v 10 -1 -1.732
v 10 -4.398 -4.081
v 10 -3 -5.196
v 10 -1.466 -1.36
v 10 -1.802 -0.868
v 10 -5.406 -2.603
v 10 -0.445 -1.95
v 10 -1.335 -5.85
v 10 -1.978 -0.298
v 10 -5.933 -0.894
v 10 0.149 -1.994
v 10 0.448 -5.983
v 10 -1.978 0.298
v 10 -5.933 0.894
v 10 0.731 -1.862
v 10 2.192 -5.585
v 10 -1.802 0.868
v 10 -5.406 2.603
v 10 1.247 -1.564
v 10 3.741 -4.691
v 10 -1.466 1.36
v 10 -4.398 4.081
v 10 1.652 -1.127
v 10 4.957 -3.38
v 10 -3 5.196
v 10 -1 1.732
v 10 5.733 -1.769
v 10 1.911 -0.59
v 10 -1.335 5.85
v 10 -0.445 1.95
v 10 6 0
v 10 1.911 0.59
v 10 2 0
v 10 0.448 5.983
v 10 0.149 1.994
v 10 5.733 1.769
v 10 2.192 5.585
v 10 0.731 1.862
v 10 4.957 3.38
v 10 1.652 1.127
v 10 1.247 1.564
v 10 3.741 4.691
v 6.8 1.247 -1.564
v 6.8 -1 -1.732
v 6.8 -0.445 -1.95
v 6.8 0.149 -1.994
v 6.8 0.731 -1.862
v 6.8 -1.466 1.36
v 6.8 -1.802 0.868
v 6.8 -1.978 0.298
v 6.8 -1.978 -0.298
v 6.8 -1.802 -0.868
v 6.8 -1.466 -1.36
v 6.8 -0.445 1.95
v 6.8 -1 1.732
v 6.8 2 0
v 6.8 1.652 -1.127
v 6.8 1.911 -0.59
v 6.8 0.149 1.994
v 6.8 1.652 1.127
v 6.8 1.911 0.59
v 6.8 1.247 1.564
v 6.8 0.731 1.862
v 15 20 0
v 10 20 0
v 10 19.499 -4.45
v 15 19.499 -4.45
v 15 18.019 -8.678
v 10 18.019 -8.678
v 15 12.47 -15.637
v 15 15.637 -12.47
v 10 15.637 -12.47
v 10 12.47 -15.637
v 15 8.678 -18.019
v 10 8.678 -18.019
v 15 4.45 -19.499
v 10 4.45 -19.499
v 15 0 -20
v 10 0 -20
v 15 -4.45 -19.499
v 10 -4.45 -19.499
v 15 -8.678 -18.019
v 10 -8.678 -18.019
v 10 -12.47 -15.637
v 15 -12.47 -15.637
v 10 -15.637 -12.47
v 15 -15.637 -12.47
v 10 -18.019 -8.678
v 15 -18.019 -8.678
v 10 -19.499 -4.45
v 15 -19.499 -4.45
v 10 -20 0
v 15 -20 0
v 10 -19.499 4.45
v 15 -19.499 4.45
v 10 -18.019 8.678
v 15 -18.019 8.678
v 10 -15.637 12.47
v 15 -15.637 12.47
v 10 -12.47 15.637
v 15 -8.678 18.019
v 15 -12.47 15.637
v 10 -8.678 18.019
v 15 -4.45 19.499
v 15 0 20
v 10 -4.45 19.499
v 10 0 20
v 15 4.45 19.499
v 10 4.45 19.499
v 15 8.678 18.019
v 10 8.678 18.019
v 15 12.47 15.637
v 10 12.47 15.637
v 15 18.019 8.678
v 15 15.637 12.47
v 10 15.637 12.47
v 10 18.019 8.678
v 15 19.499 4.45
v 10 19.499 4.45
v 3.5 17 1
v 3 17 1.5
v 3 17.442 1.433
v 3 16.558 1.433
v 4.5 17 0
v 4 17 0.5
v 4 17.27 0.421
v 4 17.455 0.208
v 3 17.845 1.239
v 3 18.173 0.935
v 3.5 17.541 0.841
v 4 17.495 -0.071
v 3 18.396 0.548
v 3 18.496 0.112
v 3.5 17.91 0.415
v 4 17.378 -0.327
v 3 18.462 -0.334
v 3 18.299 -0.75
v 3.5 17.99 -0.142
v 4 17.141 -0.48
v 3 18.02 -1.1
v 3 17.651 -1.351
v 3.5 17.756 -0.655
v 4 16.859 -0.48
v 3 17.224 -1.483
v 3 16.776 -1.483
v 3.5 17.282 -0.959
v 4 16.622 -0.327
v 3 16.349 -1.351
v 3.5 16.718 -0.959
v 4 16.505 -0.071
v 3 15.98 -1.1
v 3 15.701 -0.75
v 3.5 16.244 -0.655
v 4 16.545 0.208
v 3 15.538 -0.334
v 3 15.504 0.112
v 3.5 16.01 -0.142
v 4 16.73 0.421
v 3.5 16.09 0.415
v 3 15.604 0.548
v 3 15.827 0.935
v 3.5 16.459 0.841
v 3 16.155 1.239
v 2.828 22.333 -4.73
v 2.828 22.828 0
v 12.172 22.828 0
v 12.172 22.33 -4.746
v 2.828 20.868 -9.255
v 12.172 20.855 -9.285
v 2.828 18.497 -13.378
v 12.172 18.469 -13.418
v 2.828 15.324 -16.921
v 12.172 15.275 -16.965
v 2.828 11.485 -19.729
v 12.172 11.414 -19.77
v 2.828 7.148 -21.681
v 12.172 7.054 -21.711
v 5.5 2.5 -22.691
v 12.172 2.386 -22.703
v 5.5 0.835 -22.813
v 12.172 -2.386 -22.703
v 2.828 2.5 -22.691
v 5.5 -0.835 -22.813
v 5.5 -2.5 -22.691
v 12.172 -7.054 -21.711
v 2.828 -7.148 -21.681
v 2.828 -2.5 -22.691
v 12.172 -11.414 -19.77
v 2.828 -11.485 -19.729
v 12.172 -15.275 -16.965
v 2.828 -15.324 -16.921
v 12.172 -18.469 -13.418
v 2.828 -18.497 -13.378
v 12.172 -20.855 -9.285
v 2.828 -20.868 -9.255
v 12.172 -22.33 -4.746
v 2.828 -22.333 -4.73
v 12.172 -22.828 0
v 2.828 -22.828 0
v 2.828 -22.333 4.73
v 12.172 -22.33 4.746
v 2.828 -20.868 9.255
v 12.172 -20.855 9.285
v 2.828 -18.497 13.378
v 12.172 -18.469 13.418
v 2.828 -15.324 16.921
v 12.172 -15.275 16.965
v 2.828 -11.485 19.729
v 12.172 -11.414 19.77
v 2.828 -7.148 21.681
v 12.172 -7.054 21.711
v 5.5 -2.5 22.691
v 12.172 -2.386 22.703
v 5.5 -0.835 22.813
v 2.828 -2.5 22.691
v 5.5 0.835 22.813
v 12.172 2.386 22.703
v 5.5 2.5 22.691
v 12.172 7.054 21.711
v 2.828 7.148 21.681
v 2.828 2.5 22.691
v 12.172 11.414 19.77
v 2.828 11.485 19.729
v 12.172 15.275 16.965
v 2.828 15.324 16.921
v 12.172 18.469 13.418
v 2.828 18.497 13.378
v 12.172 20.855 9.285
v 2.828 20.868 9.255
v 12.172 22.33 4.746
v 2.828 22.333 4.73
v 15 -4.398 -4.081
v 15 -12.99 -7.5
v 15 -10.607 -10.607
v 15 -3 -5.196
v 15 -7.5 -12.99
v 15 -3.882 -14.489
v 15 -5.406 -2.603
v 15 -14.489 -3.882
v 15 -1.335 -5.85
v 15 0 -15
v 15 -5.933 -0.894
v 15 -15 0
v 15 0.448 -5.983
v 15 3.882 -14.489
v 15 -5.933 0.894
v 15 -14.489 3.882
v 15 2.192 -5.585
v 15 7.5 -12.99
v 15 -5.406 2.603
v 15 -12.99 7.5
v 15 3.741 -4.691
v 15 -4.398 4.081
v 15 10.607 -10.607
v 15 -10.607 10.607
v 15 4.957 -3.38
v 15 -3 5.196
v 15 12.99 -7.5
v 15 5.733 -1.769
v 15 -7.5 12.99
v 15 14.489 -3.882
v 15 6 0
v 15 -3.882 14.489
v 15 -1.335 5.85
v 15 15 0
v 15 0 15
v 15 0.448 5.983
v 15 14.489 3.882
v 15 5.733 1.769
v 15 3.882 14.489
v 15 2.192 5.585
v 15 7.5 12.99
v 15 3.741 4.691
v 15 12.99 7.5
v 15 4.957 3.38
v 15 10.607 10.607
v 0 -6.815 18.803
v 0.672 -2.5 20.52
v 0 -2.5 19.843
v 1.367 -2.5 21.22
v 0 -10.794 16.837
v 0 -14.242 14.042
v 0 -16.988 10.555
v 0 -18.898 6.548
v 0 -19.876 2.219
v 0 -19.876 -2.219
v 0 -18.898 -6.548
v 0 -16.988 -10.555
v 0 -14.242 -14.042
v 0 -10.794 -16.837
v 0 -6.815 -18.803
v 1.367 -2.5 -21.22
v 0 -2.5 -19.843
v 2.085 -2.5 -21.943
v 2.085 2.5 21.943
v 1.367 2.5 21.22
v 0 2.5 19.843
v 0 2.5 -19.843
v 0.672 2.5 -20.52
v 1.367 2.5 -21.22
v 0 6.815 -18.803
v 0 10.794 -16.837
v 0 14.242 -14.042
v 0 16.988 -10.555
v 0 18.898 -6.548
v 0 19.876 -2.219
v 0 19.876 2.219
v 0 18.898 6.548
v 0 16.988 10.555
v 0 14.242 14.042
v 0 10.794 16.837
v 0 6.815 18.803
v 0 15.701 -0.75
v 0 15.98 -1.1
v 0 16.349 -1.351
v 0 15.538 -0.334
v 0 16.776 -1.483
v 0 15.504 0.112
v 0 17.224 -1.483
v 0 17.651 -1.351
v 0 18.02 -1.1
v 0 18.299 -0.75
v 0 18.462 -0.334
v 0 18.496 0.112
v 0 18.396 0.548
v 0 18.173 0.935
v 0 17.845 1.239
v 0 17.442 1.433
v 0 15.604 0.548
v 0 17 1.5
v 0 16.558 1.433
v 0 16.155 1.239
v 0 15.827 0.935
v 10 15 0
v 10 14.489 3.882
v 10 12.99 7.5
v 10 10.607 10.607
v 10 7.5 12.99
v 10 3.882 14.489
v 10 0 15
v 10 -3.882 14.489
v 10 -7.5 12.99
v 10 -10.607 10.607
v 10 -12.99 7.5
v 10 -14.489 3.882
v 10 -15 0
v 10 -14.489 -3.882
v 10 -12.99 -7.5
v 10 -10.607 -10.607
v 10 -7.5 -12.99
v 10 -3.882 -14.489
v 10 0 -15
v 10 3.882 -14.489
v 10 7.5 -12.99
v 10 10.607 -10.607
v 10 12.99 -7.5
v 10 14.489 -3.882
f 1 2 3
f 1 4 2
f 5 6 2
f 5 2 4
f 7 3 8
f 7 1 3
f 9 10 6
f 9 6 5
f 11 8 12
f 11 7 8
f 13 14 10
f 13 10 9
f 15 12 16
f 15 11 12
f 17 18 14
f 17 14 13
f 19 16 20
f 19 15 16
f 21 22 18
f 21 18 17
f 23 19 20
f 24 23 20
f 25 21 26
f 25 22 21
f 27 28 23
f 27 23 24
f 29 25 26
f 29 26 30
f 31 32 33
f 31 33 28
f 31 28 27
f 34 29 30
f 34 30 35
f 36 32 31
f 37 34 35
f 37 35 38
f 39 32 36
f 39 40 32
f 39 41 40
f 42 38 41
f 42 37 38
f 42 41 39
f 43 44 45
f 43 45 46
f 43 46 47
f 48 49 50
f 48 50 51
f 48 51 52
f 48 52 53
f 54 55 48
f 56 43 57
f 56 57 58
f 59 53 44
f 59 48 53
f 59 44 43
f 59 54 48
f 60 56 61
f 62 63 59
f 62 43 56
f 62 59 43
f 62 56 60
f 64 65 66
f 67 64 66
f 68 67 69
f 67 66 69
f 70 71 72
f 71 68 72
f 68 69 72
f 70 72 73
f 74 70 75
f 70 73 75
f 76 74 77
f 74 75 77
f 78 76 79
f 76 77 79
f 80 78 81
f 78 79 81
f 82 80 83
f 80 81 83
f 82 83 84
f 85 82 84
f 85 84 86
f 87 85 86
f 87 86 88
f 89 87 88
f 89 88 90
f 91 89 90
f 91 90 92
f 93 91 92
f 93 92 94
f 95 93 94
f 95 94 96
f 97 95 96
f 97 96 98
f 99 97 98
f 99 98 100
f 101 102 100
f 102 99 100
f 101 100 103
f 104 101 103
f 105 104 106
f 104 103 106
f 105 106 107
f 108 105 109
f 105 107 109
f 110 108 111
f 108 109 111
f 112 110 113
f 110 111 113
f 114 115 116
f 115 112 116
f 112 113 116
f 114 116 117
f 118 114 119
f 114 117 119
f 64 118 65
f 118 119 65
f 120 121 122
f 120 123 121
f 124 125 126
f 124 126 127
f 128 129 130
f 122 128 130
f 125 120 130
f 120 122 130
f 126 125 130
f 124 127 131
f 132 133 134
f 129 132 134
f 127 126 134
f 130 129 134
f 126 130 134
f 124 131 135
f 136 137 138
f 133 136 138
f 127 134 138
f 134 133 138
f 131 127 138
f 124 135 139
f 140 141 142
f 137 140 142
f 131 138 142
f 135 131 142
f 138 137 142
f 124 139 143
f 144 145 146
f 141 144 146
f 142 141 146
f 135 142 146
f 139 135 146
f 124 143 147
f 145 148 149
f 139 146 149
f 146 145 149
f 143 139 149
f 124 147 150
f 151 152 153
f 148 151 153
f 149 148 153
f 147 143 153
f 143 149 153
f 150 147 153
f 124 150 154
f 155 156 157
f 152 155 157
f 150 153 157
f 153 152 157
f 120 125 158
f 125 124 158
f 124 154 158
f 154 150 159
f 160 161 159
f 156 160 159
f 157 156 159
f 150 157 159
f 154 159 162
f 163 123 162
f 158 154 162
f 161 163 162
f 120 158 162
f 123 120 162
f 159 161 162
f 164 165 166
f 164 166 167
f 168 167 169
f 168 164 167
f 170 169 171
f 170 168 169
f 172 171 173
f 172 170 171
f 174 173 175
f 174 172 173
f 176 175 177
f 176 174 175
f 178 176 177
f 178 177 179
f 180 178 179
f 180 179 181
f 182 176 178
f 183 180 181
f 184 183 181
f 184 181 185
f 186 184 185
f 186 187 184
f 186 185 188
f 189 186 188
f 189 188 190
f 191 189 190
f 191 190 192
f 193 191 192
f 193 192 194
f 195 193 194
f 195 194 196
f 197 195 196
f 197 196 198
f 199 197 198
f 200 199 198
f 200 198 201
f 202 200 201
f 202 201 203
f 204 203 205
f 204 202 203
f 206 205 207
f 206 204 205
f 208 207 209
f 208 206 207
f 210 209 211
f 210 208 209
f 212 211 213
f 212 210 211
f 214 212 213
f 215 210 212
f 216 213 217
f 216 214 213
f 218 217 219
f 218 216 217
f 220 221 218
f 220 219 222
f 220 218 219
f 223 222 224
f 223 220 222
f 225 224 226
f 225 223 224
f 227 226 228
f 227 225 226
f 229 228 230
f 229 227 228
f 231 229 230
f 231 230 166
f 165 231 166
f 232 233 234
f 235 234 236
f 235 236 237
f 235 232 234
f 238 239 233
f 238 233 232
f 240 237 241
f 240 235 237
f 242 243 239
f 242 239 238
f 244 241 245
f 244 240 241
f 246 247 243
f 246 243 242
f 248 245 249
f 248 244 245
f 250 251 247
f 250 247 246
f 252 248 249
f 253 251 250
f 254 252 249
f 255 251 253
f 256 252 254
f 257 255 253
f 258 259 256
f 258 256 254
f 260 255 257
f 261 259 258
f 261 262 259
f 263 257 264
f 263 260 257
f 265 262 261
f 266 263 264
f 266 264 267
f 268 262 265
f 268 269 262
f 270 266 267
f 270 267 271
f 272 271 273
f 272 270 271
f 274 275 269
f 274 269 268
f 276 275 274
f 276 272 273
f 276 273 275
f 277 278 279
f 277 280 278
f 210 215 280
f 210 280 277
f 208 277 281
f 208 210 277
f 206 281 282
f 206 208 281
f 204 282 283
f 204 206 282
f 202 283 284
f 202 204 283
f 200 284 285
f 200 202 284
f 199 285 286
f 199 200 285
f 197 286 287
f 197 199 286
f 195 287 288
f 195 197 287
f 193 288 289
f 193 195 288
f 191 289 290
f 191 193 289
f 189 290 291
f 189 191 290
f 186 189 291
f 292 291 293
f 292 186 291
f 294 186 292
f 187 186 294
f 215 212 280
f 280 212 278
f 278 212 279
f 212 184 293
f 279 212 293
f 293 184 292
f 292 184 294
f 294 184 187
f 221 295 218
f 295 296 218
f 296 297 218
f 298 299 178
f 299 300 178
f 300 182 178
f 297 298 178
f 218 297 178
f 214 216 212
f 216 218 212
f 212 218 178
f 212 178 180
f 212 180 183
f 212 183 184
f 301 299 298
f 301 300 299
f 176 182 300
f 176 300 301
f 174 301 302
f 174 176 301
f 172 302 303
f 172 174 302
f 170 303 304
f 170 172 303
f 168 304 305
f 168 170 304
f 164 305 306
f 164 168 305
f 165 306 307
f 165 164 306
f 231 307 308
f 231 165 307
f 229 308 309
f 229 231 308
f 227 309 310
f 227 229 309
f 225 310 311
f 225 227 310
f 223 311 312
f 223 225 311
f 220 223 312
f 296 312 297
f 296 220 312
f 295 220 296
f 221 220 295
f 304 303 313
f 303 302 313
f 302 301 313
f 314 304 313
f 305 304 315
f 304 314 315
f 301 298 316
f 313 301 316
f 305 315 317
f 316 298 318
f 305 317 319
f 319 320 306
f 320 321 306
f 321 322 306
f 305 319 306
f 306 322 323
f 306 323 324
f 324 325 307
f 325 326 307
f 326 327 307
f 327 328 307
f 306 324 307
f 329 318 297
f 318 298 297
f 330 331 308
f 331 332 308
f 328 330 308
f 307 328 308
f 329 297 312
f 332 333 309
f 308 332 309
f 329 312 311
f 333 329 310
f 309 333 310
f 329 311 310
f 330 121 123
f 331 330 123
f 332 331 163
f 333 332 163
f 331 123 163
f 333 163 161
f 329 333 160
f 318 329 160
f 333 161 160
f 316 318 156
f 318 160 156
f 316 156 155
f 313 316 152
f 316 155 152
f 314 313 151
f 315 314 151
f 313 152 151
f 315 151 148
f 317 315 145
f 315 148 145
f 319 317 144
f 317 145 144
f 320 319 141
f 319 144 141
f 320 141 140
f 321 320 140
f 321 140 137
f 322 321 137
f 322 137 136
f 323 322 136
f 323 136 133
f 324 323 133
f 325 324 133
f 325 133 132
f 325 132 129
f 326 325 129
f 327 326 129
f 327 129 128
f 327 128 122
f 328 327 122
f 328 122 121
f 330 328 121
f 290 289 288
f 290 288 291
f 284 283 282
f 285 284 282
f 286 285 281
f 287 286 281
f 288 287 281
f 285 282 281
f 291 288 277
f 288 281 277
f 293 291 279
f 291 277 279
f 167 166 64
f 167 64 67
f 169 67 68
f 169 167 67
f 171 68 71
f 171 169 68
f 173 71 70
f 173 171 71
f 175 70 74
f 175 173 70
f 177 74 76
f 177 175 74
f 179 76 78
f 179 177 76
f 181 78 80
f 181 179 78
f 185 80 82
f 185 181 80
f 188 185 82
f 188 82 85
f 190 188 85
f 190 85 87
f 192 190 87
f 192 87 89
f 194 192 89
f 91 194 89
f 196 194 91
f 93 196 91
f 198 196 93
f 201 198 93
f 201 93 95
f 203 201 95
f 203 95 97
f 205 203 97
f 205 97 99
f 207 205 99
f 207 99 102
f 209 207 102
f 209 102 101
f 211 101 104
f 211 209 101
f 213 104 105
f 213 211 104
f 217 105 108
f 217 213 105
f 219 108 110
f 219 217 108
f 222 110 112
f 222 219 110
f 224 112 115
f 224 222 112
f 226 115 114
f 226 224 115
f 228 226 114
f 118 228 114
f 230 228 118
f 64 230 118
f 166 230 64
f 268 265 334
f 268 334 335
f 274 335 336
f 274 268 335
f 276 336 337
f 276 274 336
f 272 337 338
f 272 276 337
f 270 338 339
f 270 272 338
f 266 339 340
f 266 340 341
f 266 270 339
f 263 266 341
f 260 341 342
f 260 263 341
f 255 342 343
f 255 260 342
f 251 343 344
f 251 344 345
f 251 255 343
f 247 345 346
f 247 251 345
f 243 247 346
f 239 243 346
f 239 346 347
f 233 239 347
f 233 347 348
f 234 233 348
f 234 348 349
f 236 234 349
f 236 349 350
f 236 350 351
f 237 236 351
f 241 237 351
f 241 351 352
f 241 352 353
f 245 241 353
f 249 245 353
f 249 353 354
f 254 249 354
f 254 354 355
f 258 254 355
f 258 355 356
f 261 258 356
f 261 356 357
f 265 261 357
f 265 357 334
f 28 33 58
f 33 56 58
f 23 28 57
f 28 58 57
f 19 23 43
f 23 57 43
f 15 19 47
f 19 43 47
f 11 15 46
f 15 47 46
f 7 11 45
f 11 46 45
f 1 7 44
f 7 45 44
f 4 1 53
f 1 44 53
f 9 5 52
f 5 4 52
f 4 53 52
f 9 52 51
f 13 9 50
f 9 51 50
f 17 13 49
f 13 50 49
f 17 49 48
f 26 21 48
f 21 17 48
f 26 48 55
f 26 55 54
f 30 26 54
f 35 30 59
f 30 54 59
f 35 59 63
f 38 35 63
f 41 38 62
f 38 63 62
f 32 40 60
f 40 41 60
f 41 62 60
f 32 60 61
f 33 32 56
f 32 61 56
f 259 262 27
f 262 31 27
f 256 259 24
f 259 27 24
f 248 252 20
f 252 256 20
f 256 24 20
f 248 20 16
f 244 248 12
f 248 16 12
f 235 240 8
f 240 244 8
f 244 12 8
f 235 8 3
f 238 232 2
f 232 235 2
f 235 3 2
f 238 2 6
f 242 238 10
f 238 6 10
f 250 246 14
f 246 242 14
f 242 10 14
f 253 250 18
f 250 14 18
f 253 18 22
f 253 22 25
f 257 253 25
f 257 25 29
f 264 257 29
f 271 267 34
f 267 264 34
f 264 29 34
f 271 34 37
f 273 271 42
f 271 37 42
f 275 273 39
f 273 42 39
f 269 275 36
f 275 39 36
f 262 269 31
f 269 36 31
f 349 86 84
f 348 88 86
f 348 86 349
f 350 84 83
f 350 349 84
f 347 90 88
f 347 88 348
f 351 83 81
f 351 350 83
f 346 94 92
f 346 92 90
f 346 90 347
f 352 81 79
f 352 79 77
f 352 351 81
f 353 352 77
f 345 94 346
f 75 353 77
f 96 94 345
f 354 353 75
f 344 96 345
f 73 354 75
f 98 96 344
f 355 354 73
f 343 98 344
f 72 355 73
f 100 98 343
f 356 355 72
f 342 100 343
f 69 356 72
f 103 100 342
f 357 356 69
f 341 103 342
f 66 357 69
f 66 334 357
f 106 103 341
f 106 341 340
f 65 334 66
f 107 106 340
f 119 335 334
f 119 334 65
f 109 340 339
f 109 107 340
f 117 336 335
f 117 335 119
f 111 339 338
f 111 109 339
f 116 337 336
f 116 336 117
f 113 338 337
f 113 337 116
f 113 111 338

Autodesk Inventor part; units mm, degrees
ref_plane "YZ Plane" through (0, 0, 0) normal (1, 0, 0) x (0, 1, 0)
ref_plane "XZ Plane" through (0, 0, 0) normal (0, 1, 0) x (-1, 0, 0)
ref_plane "XY Plane" through (0, 0, 0) normal (0, 0, 1) x (1, 0, 0)
sketch "Эскиз1" plane through (0, 0, 0) normal (0, 0, 1) x (1, 0, 0)
  line L0 (0, 0) -> (0, 20)
  line L1 (0, 20) -> (2.8284, 22.8284)
  line L2 (0, 0) -> (15, 0)
  line L3 (15, 0) -> (15, 20)
  line L4 (15, 20) -> (12.1716, 22.8284)
  line L5 (12.1716, 22.8284) -> (2.8284, 22.8284)
  dimension "d0" = 20
  dimension "d1" = 4
  dimension "d2" = 135
  dimension "d3" = 15
  dimension "d4" = 4
  dimension "d5" = 135
revolve "Вращение1" add sketch "Эскиз1" angle 360 about axis through (0, 0, 0) along (1, 0, 0)
sketch "Эскиз2" plane through (0, 0, 0) normal (0, 0, 1) x (1, 0, 0)
  line L0 (15, -20) -> (15, 20) projected
  line L1 (15, 20) -> (10, 20)
  line L2 (10, 20) -> (10, 15)
  line L3 (10, 15) -> (15, 15)
  line L4 (15, 15) -> (15, 20)
  line L5 (15, 6) -> (10, 6)
  line L6 (10, 6) -> (10, 2)
  line L7 (10, 0) -> (15, 0)
  line L8 (15, 0) -> (15, 6)
  line L9 (10, 2) -> (6.8, 2)
  line L10 (6.8, 2) -> (6.8, 0)
  line L11 (6.8, 0) -> (10, 0)
  point P0 (0, 0)
  point P1 (15, 0)
  dimension "d7" = 5
  dimension "d8" = 5
  dimension "d9" = 6
  dimension "d10" = 2
  dimension "d11" = 5
  dimension "d12" = 3.2
revolve "Вращение2" cut sketch "Эскиз2" angle 360 about axis through (6.8, 0, 0) along (1, 0, 0)
sketch "Эскиз4" plane through (0, 0, 0) normal (1, 0, 0) x (0, 1, 0)
  point P0 (0, 0)
  point P1 (17, 0)
  dimension "d17" = 17
hole "Отверстие1" at (0, 17, 0) direction (1, 0, 0) diameter 3 depth 3 tip angle 90
sketch "Эскиз5" plane through (0, 0, 0) normal (0, 0, 1) x (1, 0, 0)
  line L0 (0, -20) -> (0, 20) projected
  line L1 (0, 2.5) -> (5.5, 2.5)
  line L2 (5.5, 2.5) -> (5.5, -2.5)
  line L3 (5.5, -2.5) -> (0, -2.5)
  line L4 (0, -2.5) -> (0, 2.5)
  point P0 (0, 0)
  point P1 (0, 0)
  point P2 (0, 0)
  dimension "d25" = 5
  dimension "d26" = 5.5
extrude "Выдавливание2" cut sketch "Эскиз5" along normal through all both and the other way through all
properties part number "711128"
